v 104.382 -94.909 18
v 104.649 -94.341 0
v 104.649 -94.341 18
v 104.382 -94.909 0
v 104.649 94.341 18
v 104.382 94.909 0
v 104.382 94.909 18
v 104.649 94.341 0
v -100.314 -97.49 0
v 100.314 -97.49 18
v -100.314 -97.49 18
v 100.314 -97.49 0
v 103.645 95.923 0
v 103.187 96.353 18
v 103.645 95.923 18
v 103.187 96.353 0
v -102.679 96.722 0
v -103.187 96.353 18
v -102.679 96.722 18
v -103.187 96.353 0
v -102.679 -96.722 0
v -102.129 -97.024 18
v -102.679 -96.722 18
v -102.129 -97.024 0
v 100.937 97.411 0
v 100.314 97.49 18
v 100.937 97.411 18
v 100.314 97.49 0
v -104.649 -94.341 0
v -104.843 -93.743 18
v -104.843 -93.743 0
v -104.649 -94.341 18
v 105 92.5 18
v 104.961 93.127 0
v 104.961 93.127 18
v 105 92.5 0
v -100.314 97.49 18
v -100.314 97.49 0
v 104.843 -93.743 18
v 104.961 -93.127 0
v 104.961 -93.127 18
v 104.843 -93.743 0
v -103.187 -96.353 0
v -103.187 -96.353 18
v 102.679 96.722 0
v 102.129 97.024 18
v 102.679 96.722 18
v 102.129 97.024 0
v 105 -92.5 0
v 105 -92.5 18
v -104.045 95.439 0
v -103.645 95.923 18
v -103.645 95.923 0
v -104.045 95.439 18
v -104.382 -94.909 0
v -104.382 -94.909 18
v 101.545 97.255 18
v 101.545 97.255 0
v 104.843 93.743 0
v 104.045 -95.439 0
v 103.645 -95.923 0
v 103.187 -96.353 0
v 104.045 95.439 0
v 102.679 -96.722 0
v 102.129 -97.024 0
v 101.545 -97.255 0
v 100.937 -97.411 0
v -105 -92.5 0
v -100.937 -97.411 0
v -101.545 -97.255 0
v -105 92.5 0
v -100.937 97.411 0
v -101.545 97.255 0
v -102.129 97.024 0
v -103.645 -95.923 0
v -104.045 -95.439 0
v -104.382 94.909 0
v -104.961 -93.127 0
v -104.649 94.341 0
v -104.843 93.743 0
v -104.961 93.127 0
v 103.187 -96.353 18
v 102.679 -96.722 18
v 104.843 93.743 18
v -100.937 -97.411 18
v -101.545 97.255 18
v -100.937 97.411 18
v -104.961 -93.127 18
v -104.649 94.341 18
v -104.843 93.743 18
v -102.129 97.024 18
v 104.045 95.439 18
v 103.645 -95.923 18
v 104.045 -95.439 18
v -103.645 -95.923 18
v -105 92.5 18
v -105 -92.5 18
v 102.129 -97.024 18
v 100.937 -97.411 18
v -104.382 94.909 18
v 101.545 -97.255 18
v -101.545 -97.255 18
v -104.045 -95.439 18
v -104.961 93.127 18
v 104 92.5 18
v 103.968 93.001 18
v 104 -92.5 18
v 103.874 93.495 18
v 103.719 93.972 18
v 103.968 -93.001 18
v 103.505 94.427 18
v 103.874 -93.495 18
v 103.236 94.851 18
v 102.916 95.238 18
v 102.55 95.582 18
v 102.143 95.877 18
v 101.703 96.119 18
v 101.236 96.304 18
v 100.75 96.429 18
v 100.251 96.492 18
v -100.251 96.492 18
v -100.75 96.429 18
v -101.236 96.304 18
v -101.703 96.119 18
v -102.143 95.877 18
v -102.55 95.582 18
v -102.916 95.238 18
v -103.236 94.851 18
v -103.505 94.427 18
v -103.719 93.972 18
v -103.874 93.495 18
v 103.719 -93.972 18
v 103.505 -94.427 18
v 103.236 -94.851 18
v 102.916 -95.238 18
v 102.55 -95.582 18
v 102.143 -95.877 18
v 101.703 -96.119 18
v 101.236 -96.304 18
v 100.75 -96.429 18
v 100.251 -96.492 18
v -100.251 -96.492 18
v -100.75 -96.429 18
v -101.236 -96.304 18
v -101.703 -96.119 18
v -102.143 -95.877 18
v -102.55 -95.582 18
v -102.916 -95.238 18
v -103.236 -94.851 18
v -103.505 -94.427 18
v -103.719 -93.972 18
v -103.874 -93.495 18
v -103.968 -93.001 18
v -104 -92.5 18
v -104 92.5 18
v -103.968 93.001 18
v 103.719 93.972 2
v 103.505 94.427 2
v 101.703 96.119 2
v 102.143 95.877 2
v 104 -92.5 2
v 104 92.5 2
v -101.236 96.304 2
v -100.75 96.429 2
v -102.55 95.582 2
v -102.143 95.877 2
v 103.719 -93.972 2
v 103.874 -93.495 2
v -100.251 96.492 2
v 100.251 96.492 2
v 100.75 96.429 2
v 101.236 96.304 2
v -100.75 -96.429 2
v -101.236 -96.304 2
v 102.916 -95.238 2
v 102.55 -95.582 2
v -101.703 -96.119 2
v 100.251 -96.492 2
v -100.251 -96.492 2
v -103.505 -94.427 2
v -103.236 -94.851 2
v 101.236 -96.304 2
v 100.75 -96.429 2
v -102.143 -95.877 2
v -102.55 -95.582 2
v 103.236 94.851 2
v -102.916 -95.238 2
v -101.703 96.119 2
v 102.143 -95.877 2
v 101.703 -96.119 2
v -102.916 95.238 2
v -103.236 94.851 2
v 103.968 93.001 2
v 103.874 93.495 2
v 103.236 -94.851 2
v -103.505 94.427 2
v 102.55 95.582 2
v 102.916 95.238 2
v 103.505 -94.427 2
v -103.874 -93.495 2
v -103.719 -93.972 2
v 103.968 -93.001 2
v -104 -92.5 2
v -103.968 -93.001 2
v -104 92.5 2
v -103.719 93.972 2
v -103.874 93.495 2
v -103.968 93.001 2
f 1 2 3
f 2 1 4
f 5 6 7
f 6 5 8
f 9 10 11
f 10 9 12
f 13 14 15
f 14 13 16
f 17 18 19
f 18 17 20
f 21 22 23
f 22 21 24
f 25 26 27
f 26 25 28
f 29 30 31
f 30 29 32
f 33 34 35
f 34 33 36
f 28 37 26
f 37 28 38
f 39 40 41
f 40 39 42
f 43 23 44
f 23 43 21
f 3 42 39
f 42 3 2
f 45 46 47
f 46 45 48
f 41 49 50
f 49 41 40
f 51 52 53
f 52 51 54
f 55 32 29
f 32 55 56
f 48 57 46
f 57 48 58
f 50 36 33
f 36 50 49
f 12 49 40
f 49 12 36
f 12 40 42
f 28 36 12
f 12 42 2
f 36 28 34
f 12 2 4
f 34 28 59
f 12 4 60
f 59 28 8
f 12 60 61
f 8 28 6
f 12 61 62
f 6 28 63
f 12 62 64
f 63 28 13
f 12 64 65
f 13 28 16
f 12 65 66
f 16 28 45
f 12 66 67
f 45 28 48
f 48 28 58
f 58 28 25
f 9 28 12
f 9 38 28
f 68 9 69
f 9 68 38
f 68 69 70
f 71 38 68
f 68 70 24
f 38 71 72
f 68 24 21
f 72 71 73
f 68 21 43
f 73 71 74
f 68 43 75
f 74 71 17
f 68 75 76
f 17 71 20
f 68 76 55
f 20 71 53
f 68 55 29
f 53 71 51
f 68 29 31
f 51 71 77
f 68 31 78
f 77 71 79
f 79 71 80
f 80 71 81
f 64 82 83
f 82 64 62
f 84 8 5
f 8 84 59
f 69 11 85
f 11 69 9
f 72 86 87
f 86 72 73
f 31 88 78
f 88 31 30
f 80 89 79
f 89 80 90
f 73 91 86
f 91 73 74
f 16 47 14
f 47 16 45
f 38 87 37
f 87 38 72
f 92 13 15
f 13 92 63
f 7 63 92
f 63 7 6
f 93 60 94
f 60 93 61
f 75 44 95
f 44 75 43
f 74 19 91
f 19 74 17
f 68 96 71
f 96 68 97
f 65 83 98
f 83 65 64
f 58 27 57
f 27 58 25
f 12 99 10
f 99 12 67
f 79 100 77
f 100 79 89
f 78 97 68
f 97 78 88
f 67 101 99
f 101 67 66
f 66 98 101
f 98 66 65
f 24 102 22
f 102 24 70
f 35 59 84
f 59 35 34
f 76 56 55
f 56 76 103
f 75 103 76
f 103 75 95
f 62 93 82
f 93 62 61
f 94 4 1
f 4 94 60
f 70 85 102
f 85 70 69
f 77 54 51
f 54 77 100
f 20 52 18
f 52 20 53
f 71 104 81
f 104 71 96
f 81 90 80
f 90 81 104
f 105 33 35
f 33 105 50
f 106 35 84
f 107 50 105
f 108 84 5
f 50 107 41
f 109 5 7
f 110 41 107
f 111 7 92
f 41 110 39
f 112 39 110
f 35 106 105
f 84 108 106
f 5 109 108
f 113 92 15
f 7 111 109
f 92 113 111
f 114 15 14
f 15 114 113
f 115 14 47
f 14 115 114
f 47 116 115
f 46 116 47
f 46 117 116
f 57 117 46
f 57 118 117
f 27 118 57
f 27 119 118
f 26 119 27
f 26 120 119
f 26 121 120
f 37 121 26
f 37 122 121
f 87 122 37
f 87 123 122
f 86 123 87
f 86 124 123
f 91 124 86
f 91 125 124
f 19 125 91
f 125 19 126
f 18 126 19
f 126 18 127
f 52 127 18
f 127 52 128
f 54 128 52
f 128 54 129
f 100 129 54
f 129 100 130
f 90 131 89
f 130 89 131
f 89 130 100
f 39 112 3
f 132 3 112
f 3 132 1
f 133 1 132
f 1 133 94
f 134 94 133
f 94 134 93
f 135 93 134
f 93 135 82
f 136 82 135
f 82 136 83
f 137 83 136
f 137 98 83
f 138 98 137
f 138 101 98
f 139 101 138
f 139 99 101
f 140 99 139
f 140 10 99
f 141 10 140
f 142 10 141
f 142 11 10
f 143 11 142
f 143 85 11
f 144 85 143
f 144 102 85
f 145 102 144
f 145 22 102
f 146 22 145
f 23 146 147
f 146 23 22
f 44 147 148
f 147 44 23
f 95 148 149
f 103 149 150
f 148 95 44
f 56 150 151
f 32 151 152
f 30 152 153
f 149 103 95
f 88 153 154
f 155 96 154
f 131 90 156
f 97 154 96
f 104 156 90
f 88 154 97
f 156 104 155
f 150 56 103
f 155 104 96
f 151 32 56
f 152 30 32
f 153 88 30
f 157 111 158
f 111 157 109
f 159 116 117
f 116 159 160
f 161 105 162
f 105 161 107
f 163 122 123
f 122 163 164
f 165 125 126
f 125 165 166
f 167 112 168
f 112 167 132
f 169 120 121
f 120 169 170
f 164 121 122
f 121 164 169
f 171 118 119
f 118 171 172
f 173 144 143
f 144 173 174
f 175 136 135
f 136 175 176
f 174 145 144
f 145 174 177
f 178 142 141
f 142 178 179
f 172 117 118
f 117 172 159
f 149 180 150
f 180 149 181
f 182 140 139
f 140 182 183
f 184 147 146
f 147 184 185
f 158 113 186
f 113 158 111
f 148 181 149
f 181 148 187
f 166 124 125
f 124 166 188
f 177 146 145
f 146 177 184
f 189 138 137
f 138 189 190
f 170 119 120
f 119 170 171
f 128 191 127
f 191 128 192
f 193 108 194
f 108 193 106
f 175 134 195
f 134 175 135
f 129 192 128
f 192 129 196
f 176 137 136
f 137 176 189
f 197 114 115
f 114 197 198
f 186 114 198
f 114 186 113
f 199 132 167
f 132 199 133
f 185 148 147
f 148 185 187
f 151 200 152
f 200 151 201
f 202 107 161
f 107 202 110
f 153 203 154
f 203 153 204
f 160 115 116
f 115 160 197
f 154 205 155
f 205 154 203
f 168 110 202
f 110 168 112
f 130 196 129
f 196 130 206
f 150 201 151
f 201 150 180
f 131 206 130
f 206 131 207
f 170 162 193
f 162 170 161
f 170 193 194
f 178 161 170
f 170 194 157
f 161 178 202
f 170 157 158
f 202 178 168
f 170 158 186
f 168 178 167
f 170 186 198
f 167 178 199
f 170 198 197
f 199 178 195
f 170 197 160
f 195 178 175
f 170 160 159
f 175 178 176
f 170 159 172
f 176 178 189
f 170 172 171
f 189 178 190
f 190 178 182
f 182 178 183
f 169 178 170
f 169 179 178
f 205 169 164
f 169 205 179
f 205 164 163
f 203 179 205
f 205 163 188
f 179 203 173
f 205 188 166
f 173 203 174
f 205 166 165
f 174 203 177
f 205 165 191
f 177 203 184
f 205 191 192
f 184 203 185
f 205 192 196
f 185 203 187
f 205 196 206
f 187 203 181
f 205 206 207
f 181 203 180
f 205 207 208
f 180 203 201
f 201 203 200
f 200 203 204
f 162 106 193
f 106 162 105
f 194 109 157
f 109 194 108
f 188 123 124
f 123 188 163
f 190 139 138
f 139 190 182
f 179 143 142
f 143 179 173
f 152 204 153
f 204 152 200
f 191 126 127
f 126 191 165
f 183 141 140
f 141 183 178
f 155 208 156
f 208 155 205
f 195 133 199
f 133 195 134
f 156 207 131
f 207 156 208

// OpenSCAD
$fn = 50;


difference() {
	union() {
		hull() {
			translate(v = [-100.0000000000, 92.5000000000, 0]) {
				cylinder(h = 18, r = 5);
			}
			translate(v = [100.0000000000, 92.5000000000, 0]) {
				cylinder(h = 18, r = 5);
			}
			translate(v = [-100.0000000000, -92.5000000000, 0]) {
				cylinder(h = 18, r = 5);
			}
			translate(v = [100.0000000000, -92.5000000000, 0]) {
				cylinder(h = 18, r = 5);
			}
		}
	}
	union() {
		translate(v = [0, 0, 2]) {
			hull() {
				translate(v = [-100.0000000000, 92.5000000000, 0]) {
					cylinder(h = 16, r = 4);
				}
				translate(v = [100.0000000000, 92.5000000000, 0]) {
					cylinder(h = 16, r = 4);
				}
				translate(v = [-100.0000000000, -92.5000000000, 0]) {
					cylinder(h = 16, r = 4);
				}
				translate(v = [100.0000000000, -92.5000000000, 0]) {
					cylinder(h = 16, r = 4);
				}
			}
		}
	}
}
